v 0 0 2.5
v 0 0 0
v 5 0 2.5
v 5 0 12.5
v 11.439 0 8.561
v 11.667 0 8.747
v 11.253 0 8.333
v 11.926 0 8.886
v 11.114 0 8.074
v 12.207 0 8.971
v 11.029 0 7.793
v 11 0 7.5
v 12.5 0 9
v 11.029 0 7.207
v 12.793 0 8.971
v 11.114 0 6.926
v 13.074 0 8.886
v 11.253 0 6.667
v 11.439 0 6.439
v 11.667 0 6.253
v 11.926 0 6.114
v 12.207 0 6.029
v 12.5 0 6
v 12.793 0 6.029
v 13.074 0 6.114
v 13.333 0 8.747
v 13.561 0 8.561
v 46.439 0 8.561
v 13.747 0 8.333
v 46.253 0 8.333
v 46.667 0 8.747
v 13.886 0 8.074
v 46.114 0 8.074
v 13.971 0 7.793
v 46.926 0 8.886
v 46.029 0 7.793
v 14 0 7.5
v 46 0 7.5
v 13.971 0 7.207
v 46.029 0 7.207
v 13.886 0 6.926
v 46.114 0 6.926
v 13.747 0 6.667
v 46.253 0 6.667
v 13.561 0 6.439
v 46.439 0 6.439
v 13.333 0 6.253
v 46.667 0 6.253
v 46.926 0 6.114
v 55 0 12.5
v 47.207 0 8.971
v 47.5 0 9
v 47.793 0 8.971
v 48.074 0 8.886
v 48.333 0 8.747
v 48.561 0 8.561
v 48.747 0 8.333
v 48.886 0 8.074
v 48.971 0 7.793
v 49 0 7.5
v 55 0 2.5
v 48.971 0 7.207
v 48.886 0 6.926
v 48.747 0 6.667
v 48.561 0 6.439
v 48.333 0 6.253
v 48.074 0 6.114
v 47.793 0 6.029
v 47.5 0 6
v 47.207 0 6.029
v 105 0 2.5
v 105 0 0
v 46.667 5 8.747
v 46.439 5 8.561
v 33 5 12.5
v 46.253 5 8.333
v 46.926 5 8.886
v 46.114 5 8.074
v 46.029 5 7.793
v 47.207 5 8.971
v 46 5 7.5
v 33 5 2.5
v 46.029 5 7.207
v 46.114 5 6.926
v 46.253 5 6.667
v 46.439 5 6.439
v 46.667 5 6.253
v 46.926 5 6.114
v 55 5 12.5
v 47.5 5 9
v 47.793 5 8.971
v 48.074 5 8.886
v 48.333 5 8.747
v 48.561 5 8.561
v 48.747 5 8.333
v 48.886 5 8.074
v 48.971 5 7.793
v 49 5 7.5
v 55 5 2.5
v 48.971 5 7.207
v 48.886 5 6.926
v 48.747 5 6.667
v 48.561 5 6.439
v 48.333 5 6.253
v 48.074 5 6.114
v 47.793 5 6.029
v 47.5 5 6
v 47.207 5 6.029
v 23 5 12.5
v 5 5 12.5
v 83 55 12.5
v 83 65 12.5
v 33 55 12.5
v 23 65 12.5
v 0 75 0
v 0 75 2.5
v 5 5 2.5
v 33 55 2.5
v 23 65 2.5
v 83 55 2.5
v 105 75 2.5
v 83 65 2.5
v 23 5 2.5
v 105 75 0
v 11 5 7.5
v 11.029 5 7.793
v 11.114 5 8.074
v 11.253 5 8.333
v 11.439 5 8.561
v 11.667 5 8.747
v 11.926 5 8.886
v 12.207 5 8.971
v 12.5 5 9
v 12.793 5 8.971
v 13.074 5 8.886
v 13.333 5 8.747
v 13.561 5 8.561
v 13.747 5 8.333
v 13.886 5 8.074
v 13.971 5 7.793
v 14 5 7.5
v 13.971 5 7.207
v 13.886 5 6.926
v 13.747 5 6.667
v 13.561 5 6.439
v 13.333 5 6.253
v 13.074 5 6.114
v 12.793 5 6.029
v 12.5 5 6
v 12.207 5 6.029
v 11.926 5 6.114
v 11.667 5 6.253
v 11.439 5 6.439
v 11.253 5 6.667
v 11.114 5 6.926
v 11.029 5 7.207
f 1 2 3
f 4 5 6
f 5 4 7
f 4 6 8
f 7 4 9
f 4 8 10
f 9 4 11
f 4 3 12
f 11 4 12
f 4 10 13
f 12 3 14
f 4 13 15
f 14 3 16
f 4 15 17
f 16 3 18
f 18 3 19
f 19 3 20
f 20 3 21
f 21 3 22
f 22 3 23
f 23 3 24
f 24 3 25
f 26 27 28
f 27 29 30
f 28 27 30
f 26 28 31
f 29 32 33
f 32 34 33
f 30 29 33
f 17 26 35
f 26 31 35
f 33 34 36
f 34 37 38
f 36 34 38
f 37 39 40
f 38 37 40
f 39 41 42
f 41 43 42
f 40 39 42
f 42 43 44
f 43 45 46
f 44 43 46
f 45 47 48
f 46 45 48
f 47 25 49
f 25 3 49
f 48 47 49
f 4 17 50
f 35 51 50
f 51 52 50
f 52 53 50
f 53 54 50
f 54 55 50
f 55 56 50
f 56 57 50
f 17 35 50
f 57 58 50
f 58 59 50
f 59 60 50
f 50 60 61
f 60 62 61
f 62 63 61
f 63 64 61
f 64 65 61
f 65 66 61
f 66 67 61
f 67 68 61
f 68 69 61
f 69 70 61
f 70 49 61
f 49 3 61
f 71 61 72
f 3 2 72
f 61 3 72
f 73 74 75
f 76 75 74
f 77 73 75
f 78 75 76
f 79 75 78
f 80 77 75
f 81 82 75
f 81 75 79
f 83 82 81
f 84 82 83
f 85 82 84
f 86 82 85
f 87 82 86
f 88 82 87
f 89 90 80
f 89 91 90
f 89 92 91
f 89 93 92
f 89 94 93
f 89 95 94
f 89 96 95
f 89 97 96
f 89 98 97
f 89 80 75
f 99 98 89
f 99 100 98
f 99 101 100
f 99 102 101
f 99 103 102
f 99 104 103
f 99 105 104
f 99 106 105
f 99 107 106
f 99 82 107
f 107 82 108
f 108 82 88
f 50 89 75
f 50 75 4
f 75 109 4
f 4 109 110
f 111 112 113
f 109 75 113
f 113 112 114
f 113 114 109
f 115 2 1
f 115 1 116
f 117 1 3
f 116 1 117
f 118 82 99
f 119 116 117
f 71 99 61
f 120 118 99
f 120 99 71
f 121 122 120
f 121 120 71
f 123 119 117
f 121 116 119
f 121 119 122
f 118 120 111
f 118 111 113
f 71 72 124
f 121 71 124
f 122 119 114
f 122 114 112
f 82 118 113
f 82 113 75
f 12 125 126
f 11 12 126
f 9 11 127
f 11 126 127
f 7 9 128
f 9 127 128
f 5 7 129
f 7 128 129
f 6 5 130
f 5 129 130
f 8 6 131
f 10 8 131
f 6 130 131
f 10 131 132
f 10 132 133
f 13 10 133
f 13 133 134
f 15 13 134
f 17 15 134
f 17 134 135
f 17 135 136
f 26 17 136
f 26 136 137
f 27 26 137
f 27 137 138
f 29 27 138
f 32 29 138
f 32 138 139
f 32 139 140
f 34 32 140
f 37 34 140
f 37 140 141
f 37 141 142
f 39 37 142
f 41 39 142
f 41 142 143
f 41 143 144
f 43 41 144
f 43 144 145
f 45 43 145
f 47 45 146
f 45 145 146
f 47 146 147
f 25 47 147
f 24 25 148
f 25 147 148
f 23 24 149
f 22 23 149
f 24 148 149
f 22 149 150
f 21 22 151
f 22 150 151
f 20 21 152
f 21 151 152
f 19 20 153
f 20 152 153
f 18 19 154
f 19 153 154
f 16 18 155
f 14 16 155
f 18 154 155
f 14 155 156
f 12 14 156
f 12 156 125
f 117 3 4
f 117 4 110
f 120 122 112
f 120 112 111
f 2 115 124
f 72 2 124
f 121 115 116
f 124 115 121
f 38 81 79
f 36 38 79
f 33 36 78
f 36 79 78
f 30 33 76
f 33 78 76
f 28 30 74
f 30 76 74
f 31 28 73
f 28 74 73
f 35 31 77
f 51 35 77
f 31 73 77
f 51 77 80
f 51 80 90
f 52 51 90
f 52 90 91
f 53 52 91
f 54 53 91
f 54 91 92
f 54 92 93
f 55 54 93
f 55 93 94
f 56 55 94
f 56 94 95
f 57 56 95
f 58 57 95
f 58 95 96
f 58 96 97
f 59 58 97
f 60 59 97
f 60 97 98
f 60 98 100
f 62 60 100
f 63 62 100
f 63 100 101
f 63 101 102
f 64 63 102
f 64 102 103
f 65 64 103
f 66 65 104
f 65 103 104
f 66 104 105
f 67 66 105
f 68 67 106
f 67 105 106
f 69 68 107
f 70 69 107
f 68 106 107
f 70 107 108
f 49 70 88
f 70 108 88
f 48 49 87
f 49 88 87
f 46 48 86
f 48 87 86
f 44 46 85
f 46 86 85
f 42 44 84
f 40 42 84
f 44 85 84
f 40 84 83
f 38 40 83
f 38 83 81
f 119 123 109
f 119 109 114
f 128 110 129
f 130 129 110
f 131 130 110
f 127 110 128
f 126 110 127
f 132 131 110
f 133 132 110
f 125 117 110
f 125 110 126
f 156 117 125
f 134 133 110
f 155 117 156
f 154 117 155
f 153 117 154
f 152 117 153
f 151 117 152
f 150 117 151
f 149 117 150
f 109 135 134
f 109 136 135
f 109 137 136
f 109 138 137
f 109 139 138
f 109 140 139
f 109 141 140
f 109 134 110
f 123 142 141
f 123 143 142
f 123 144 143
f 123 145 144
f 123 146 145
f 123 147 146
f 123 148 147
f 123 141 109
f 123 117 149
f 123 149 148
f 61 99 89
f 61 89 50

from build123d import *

# Parameters (mm, degrees)
SKETCH_W     = 105
SKETCH_H     = 75
PAD_DEPTH    = 2.5
PAD001_DEPTH = 10
SKETCH002_R  = 1.5
POCKET_DEPTH = 5.001


with BuildPart() as part:
    # Sketch → Pad (new body)
    with BuildSketch(Plane.XY):
        with Locations((52.5, 37.5)):
            Rectangle(SKETCH_W, SKETCH_H)
    extrude(amount=PAD_DEPTH)

    # Sketch001 → Pad001 (new body)
    with BuildSketch(Plane.XY.offset(2.5)):
        Polygon((5, 0), (5, 5), (23, 5), (23, 65), (83, 65), (83, 55), (33, 55), (33, 5), (55, 5), (55, 0), align=None)
    extrude(amount=PAD001_DEPTH)

    # Sketch002 → Pocket (cut, through all)
    with BuildSketch(Plane(origin=(0, 5, 0), x_dir=(-1, 0, 0), z_dir=(0, 1, 0))):
        with Locations((-12.5, 7.5)):
            Circle(SKETCH002_R)
        with Locations((-47.5, 7.5)):
            Circle(SKETCH002_R)
    extrude(amount=-POCKET_DEPTH, mode=Mode.SUBTRACT)


solid = part.part
